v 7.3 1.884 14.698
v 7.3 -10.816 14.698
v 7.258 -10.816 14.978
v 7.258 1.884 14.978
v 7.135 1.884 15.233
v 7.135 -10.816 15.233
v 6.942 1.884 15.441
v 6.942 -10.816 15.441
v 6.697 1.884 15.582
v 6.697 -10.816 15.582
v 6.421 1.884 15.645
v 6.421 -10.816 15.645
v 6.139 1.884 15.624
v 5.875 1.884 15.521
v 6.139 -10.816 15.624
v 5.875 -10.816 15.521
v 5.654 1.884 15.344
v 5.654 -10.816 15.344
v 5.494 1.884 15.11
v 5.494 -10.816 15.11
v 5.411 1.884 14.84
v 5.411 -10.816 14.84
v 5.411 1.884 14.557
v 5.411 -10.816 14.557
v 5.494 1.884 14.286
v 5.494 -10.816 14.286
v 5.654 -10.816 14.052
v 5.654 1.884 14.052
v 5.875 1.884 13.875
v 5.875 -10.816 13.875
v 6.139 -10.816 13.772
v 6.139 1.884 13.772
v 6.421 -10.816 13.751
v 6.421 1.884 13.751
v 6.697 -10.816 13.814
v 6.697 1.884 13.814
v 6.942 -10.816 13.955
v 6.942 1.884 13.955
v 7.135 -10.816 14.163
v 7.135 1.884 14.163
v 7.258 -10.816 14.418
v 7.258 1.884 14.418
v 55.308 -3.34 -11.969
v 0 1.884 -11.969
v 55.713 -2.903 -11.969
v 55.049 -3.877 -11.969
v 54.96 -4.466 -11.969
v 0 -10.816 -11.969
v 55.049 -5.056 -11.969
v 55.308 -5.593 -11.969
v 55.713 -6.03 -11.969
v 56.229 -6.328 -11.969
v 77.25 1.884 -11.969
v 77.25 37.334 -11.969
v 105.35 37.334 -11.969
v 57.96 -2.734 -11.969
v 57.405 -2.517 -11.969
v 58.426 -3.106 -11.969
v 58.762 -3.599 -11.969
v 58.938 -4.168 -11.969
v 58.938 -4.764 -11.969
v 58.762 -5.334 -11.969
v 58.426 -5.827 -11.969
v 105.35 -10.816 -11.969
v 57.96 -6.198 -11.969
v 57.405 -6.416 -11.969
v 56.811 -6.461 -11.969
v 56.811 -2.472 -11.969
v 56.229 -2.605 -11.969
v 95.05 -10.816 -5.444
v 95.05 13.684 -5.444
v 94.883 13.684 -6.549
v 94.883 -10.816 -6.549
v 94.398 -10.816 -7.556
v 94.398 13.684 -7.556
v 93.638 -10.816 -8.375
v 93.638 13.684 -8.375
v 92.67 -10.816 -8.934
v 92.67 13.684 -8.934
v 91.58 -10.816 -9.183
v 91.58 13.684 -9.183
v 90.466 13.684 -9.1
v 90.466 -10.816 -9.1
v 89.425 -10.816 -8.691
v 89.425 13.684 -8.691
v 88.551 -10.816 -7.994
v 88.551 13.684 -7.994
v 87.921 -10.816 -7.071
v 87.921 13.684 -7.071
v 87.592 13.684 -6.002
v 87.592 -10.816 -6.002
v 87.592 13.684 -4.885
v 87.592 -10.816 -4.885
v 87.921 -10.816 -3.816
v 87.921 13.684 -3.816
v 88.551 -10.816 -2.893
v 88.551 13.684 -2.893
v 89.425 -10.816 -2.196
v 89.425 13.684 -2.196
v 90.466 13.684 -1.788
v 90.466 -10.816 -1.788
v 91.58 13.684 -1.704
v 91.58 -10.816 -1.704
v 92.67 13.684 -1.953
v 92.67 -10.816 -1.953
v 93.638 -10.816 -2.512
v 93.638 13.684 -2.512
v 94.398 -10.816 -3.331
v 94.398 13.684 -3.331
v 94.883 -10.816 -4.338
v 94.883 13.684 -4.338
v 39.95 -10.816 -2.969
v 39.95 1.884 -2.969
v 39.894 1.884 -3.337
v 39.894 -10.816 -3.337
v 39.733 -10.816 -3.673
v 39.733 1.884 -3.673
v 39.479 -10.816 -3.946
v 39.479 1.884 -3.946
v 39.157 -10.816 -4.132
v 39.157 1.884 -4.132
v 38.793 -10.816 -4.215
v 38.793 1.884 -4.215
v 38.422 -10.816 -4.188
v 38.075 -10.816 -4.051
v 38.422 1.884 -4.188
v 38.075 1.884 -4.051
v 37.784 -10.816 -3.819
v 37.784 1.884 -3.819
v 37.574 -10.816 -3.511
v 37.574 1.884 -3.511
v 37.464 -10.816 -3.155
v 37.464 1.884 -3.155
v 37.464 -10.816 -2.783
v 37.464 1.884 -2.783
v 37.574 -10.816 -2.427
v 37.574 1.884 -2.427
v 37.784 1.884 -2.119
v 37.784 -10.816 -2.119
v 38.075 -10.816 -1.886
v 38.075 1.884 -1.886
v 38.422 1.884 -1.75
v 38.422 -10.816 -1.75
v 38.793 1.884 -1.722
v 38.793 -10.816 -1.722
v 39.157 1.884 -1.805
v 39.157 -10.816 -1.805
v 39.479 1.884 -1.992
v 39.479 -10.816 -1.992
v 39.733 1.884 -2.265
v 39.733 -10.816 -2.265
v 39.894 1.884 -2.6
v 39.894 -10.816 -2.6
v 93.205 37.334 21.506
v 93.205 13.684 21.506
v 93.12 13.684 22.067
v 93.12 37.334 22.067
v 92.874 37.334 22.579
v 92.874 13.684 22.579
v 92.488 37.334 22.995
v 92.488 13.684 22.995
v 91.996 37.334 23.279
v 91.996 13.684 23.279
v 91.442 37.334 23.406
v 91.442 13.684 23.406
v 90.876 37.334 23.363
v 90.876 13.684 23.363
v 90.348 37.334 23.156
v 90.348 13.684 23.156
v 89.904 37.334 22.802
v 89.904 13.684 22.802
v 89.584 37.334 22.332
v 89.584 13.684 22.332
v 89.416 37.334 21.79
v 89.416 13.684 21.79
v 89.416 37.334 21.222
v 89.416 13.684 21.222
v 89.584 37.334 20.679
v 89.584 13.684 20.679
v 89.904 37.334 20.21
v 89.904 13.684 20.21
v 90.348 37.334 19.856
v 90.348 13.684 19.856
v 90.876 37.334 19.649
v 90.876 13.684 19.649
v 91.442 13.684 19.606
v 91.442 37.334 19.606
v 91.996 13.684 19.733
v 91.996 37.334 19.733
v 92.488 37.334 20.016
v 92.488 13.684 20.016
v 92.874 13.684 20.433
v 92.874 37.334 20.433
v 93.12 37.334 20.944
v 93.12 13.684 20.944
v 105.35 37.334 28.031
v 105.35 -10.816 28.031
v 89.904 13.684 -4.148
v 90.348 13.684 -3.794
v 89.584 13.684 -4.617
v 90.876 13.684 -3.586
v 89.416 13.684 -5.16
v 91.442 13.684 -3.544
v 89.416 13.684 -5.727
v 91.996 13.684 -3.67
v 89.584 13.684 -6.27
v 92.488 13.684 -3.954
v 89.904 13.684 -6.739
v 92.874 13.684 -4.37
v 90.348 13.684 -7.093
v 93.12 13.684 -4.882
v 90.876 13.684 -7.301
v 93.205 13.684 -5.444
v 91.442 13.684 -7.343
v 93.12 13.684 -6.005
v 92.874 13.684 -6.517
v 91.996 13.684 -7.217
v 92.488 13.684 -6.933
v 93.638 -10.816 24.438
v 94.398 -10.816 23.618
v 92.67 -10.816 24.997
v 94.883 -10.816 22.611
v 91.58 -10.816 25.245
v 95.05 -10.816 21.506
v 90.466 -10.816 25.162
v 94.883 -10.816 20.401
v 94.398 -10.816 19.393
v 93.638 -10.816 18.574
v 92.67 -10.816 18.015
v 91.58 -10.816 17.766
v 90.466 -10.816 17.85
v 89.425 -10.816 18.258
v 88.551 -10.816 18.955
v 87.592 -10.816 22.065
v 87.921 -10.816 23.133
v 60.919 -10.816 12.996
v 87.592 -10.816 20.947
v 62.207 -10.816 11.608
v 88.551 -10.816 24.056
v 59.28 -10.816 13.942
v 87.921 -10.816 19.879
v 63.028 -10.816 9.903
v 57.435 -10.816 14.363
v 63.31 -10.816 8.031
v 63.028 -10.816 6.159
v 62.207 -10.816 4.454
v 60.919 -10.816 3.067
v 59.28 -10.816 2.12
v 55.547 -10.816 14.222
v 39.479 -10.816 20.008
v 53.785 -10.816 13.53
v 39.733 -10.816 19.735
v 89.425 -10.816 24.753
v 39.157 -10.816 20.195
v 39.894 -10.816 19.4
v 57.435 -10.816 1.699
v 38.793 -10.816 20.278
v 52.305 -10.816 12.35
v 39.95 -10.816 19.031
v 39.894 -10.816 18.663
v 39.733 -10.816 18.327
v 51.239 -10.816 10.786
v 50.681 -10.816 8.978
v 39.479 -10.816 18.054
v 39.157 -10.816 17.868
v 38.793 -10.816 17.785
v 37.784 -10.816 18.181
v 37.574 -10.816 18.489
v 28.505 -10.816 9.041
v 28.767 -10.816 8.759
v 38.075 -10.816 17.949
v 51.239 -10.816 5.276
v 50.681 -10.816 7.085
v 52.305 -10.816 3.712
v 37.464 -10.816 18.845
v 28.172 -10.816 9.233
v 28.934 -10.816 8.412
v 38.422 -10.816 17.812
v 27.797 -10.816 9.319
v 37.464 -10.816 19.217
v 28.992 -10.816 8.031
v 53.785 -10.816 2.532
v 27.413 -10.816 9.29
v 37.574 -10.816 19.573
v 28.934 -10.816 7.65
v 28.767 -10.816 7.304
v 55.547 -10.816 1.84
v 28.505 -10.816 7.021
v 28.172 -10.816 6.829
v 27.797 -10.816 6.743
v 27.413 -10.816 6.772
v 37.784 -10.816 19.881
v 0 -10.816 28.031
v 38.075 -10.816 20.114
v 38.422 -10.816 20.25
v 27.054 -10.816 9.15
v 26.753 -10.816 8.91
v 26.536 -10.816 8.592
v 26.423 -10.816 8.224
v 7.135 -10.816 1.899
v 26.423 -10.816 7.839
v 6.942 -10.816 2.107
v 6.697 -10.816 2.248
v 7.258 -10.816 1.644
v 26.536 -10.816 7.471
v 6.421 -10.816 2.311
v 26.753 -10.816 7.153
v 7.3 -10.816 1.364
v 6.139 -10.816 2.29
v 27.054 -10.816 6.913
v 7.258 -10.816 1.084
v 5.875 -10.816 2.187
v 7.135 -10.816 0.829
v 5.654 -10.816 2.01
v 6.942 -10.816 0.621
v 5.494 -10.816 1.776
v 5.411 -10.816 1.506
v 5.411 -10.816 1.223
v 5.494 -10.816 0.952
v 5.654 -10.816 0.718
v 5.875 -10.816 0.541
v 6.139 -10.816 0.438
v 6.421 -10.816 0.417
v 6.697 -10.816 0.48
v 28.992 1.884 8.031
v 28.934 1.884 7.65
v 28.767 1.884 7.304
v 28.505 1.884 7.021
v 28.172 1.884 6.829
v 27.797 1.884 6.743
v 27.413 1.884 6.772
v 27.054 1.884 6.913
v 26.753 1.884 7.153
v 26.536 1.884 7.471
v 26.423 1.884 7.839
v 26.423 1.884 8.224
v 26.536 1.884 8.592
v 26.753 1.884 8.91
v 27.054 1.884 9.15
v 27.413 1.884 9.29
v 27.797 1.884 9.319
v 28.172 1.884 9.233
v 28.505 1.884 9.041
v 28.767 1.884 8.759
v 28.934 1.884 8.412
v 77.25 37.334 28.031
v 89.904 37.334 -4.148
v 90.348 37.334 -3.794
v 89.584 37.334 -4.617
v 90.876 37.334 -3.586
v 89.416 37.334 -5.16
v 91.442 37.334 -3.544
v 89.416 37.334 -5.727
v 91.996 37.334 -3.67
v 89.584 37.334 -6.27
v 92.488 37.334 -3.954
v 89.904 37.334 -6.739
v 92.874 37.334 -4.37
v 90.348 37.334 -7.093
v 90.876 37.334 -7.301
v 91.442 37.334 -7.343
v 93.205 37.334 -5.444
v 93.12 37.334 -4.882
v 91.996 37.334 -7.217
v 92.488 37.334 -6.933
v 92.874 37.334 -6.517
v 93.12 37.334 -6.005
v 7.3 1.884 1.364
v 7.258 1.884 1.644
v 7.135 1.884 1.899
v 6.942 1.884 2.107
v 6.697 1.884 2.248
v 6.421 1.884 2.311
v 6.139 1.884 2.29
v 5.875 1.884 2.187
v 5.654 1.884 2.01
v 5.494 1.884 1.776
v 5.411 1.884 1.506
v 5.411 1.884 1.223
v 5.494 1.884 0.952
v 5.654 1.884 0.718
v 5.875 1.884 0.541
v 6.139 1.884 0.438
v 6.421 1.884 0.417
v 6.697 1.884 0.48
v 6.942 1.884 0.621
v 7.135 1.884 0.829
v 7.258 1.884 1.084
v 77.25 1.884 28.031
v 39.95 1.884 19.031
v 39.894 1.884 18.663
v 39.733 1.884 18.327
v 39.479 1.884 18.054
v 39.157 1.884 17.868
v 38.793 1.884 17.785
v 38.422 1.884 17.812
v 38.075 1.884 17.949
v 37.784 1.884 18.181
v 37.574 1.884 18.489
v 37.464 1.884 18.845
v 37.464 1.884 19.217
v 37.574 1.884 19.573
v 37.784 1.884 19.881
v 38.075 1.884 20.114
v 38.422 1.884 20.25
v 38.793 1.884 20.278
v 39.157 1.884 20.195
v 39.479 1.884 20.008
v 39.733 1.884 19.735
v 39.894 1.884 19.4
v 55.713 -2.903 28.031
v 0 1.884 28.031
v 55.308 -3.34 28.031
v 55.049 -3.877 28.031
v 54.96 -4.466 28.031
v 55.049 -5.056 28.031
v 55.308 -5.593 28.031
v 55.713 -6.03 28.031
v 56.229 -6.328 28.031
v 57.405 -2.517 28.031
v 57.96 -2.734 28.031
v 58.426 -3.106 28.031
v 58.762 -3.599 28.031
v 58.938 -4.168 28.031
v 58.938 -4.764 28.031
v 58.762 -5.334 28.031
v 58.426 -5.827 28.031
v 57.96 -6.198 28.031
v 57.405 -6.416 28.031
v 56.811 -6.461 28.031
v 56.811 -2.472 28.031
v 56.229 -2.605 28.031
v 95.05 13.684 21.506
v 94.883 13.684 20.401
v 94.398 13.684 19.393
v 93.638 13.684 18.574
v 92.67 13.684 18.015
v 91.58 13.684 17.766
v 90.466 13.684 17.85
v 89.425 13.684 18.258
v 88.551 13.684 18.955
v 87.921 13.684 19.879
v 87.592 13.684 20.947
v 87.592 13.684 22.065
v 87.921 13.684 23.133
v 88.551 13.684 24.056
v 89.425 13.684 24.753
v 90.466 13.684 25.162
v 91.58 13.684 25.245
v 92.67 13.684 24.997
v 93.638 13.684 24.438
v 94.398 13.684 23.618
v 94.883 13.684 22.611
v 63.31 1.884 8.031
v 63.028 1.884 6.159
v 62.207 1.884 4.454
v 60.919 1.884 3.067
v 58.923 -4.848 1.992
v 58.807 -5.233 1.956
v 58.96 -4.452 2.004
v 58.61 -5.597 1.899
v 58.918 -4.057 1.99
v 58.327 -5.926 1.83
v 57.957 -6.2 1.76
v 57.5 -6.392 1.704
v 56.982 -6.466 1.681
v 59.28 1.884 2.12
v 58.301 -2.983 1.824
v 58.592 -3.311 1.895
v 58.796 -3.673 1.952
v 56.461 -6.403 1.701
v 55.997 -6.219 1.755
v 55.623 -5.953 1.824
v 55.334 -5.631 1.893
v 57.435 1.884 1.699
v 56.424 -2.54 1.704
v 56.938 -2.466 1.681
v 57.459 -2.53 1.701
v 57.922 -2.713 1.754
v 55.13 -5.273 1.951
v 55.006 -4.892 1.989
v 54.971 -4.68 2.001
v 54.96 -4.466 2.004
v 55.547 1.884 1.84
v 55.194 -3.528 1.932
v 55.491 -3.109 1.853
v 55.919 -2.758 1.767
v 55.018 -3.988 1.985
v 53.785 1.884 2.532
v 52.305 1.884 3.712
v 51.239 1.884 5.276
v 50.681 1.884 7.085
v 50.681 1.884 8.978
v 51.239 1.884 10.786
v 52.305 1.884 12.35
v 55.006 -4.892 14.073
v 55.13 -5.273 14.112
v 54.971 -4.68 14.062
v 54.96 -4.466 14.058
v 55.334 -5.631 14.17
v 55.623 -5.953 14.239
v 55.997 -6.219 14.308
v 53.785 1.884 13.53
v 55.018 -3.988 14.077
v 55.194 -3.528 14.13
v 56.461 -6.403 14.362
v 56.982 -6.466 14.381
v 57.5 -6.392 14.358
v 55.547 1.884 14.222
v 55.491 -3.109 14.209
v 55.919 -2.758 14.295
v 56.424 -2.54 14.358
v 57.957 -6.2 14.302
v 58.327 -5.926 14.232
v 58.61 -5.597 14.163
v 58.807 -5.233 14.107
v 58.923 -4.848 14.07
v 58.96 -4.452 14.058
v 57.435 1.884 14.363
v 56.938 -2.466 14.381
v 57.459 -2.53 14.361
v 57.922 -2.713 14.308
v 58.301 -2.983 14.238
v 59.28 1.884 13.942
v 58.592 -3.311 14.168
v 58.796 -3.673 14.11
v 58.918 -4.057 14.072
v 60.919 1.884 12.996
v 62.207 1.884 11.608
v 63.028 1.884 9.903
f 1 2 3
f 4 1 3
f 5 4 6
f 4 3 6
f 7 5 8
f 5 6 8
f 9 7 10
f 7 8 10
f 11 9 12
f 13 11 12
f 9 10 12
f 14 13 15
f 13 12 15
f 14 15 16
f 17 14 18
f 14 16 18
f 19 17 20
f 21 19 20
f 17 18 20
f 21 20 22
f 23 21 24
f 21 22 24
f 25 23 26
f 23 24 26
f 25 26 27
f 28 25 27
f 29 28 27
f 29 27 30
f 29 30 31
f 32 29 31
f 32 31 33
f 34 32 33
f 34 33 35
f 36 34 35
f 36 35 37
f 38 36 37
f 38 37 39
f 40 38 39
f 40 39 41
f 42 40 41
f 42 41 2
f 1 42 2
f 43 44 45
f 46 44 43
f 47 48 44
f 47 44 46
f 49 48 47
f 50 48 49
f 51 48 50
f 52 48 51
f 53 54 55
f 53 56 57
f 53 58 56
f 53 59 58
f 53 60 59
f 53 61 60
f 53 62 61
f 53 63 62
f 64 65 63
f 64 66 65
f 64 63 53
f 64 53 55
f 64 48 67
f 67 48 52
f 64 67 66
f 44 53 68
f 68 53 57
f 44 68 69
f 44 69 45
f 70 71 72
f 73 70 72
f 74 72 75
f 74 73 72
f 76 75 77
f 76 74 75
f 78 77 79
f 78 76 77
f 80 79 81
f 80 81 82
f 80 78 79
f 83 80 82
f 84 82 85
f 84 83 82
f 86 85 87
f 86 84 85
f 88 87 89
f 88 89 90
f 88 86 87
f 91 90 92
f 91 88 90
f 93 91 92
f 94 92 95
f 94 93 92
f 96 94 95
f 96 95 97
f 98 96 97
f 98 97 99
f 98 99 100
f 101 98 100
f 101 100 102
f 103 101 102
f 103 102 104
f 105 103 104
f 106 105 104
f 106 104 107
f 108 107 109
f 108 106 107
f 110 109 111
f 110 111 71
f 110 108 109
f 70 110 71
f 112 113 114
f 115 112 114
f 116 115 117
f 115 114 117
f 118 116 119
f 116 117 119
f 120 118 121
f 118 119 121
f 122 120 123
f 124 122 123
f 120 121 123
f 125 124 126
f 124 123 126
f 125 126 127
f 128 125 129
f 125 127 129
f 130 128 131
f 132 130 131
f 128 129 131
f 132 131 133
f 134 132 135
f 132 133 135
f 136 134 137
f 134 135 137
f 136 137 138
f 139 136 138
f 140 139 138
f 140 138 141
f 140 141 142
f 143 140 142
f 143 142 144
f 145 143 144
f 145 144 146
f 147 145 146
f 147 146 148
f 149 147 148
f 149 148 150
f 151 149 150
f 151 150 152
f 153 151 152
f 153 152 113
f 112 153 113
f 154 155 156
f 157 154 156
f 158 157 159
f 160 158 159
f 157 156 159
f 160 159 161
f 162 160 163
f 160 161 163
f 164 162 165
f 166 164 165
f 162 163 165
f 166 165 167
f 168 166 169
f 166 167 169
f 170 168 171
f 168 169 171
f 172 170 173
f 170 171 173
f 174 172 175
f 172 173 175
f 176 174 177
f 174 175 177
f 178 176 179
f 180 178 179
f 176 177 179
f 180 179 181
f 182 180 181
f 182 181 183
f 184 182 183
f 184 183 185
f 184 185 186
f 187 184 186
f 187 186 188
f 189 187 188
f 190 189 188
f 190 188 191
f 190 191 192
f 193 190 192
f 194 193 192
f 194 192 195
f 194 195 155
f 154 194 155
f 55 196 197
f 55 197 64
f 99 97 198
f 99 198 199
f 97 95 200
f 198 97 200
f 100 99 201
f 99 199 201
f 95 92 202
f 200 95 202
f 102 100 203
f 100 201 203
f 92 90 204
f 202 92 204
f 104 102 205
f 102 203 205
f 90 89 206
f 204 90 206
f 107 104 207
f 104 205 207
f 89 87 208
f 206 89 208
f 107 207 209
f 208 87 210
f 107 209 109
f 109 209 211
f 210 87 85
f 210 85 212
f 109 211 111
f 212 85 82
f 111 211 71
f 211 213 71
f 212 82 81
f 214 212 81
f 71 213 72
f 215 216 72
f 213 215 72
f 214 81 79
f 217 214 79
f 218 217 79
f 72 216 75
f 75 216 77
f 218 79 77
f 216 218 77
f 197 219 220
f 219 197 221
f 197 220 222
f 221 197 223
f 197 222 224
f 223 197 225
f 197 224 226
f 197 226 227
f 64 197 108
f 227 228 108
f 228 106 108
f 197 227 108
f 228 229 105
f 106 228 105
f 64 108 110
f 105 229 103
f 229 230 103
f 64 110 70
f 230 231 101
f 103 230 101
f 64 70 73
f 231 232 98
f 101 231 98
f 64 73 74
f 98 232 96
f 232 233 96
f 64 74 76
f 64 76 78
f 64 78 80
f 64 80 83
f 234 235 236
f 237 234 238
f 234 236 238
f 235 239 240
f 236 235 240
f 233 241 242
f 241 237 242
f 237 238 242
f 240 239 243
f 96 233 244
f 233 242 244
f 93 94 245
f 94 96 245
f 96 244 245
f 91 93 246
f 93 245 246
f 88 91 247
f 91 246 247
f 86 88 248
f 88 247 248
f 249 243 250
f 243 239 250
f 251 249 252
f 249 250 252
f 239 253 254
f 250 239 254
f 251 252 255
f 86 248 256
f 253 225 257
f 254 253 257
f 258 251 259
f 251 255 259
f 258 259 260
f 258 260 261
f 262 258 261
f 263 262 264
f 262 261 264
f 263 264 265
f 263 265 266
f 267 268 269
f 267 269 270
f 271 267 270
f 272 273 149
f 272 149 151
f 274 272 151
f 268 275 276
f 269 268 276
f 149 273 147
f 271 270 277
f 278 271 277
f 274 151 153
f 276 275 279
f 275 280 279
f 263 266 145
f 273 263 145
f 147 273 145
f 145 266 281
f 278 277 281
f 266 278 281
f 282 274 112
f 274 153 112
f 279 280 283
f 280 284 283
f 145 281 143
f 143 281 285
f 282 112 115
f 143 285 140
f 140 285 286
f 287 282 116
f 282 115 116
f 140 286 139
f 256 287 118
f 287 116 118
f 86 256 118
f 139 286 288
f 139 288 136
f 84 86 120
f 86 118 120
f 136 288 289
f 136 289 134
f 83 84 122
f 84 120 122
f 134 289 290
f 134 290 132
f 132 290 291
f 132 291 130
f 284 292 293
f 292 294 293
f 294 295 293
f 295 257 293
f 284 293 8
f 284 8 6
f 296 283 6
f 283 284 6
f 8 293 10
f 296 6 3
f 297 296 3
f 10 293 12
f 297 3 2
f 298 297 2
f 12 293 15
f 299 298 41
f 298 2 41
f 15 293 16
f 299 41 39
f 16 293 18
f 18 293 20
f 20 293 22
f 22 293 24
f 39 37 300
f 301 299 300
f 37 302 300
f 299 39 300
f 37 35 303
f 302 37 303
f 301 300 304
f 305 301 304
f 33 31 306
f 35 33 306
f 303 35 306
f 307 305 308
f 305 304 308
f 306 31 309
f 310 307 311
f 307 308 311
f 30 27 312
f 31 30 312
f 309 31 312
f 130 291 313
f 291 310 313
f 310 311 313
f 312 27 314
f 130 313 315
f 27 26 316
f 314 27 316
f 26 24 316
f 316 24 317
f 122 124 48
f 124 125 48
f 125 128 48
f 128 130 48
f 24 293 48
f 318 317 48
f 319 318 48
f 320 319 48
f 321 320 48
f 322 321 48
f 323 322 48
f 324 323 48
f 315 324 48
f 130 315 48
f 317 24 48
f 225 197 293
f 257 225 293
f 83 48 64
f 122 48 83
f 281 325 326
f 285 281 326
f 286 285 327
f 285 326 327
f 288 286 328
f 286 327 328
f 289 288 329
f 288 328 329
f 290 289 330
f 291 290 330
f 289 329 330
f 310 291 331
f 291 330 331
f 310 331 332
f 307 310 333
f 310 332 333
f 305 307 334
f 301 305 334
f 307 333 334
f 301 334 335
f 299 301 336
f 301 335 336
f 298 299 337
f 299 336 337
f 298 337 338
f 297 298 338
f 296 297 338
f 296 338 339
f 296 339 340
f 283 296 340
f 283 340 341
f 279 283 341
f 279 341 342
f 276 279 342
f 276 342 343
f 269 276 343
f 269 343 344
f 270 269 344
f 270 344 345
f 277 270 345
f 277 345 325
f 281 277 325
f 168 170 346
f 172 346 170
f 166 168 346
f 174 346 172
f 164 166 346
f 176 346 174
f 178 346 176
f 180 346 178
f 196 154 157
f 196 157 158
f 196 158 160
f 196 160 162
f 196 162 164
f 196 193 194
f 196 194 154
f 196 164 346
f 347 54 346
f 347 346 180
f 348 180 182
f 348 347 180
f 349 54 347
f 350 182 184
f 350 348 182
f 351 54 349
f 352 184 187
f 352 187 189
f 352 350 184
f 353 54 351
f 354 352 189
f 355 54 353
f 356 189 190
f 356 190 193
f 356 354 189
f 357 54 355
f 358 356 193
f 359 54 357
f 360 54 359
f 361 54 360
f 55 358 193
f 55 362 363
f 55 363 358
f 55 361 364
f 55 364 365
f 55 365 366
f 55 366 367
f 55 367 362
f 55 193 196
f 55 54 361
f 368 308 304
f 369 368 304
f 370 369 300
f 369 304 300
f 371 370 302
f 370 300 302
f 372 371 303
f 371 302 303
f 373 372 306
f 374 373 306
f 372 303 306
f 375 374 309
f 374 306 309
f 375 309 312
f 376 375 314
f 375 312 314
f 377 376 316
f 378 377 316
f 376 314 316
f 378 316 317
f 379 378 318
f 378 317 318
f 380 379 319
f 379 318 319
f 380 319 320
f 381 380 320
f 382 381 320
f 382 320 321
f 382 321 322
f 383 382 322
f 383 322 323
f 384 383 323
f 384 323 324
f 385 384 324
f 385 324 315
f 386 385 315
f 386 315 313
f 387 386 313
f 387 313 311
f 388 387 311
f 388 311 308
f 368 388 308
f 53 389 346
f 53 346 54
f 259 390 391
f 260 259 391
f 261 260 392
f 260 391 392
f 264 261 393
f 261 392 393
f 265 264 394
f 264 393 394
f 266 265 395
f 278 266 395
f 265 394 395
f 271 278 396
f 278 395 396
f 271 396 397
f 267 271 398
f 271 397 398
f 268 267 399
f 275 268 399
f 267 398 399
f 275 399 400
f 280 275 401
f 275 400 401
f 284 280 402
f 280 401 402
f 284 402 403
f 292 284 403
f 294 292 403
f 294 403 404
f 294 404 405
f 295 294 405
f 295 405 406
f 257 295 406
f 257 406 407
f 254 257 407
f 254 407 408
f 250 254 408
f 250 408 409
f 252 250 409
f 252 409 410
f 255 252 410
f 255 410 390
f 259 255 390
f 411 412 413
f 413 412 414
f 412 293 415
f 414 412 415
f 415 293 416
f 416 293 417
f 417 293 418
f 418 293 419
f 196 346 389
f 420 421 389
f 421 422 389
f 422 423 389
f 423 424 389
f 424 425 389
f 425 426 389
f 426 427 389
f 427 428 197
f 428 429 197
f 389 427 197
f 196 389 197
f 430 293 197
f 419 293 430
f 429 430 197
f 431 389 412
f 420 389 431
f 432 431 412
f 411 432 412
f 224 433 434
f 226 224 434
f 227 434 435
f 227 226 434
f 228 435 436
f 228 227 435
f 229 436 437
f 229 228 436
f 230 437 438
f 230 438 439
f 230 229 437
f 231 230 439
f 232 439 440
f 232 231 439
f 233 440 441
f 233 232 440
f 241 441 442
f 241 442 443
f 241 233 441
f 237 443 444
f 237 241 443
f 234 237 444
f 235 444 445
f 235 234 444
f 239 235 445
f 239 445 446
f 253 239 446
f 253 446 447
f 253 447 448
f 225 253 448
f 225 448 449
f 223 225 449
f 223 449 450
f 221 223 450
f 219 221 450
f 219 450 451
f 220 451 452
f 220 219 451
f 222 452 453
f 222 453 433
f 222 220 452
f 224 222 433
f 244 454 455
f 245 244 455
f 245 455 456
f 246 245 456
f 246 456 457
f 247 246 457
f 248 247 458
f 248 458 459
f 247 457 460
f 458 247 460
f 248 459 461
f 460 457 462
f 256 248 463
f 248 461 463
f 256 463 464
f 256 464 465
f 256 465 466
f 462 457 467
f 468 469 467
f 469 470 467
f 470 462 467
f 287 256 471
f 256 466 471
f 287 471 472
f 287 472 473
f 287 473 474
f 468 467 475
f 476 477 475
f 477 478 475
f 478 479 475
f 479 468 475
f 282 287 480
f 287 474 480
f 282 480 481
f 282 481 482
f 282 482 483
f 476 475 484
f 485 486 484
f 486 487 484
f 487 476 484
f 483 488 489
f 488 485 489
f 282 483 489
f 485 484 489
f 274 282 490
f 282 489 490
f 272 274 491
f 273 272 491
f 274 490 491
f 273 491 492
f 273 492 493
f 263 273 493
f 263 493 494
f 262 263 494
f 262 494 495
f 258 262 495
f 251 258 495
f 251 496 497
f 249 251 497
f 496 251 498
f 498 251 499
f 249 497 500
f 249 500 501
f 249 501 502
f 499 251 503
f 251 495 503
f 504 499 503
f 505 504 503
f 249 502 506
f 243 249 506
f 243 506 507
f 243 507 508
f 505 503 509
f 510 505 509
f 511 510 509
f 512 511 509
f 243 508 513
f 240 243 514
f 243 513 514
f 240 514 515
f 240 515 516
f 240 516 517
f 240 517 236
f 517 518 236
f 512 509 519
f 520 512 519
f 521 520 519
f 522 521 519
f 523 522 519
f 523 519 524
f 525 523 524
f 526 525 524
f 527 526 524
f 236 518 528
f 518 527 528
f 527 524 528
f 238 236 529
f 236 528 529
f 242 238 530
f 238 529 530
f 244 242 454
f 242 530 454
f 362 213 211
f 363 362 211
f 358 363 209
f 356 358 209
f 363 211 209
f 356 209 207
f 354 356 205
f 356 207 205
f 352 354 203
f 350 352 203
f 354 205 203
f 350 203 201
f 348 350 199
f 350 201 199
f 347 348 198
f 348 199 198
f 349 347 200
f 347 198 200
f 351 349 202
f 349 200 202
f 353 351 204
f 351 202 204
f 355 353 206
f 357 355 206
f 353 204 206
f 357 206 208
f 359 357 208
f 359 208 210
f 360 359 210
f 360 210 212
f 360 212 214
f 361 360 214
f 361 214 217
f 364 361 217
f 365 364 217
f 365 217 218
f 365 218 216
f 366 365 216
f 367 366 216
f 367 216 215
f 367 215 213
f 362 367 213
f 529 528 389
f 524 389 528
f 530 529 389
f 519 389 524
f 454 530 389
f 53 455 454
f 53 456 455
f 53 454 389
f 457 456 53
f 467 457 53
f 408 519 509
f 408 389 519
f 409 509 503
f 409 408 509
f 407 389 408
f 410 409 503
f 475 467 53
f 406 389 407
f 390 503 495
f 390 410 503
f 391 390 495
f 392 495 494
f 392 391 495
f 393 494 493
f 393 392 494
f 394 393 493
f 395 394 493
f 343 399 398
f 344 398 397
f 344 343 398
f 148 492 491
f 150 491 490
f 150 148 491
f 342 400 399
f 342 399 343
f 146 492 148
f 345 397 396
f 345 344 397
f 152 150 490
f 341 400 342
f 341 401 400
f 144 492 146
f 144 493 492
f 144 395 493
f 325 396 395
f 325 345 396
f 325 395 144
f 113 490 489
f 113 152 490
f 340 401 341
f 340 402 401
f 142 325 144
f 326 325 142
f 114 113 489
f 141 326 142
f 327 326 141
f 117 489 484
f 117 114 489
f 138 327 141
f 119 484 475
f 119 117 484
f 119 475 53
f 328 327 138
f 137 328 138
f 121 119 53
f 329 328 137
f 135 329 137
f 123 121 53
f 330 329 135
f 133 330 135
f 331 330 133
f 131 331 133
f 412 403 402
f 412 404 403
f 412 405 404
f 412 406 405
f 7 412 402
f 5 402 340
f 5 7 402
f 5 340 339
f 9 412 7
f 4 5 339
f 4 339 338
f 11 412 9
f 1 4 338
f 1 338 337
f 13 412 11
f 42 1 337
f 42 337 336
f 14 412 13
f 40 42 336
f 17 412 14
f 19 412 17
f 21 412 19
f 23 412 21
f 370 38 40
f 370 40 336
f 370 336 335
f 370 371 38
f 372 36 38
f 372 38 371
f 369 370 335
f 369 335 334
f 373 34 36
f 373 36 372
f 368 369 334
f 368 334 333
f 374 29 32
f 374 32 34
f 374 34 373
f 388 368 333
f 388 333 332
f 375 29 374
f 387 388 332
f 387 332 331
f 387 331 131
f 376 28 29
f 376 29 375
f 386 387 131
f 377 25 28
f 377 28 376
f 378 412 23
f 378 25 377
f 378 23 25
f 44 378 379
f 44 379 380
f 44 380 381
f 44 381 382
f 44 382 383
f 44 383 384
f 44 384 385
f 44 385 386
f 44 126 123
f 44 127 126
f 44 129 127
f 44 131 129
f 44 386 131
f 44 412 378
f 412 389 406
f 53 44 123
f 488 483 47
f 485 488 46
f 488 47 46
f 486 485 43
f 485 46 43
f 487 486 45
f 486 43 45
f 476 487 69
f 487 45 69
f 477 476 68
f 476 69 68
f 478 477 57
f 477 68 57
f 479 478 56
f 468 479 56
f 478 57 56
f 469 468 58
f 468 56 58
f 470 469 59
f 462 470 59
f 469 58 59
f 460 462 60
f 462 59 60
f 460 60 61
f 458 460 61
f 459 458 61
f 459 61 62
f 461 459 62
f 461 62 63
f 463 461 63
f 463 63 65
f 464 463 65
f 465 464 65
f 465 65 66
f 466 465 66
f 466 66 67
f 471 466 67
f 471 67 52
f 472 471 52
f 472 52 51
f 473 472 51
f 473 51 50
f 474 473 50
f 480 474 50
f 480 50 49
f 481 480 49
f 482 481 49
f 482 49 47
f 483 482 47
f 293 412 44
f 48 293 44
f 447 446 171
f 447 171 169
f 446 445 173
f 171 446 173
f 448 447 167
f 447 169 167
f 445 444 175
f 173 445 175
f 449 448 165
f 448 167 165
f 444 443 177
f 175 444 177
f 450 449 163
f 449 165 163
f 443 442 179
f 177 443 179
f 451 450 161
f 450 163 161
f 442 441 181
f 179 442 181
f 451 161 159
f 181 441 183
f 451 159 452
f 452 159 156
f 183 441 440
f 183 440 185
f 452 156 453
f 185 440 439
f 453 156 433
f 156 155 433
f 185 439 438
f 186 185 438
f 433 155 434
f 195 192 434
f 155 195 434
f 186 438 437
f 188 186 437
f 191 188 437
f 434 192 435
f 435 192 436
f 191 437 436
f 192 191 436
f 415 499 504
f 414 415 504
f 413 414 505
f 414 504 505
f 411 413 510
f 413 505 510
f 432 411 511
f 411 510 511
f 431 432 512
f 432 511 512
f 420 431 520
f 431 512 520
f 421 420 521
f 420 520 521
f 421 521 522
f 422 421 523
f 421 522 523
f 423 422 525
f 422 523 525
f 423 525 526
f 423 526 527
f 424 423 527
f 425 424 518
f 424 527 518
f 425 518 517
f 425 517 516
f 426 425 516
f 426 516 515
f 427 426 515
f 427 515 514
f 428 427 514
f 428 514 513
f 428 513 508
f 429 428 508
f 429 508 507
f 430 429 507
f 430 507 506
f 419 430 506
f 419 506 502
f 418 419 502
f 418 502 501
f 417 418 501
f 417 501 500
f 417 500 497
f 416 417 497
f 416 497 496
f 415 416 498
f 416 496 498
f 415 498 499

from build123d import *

# Parameters (mm, degrees)
SKETCH2_W                = 40
SKETCH2_H                = 12.7
BOSS_EXTRUDE1_DEPTH      = 105.35
SKETCH4_R                = 6.35
CUT_EXTRUDE1_DEPTH       = 13.7
F_4_0_4_DIAMETER_HOLE1_D = 4
SKETCH9_R                = 1.291519898
SKETCH9_R_2              = 1.25
CUT_EXTRUDE3_DEPTH       = 13.7000001
SKETCH14_W               = 28.1
SKETCH14_H               = 40
BOSS_EXTRUDE3_DEPTH      = 35.45
SKETCH10_R               = 3.75
CUT_EXTRUDE4_DEPTH       = 24.5
SKETCH15_R               = 1.905
CUT_EXTRUDE7_DEPTH       = 24.65
SKETCH17_R               = 0.95
CUT_EXTRUDE8_DEPTH       = 21


with BuildPart() as part:
    # Sketch2 → Boss-Extrude1 (new body)
    with BuildSketch(Plane(origin=(0, 0, 0), x_dir=(0, 0, -1), z_dir=(1, 0, 0))):
        with Locations((-8.031139822, -4.466363736)):
            Rectangle(SKETCH2_W, SKETCH2_H)
    extrude(amount=BOSS_EXTRUDE1_DEPTH)

    # Sketch4 → Cut-Extrude1 (cut, through all)
    with BuildSketch(Plane(origin=(0, 1.883636264, 0), x_dir=(1, 0, 0), z_dir=(0, 1, 0))):
        with Locations((56.96, -8.031139822)):
            Circle(SKETCH4_R)
    extrude(amount=-CUT_EXTRUDE1_DEPTH, mode=Mode.SUBTRACT)

    # Ø4.0 (4) Diameter Hole1 (through all)
    with Locations(Plane.XY.offset(28.031139822)):
        with Locations((56.96, -4.466363736)):
            Hole(F_4_0_4_DIAMETER_HOLE1_D / 2)

    # Sketch9 → Cut-Extrude3 (cut, through all)
    with BuildSketch(Plane(origin=(0, 1.883636264, 0), x_dir=(1, 0, 0), z_dir=(0, 1, 0))):
        with Locations((27.7, -8.031139822)):
            Circle(SKETCH9_R)
        with Locations((38.7, 2.968860178)):
            Circle(SKETCH9_R_2)
        with Locations((38.7, -19.031139822)):
            Circle(SKETCH9_R_2)
    extrude(amount=-CUT_EXTRUDE3_DEPTH, mode=Mode.SUBTRACT)

    # Sketch14 → Boss-Extrude3 (add)
    with BuildSketch(Plane(origin=(0, 1.883636264, 0), x_dir=(1, 0, 0), z_dir=(0, 1, 0))):
        with Locations((91.3, -8.031139822)):
            Rectangle(SKETCH14_W, SKETCH14_H)
    extrude(amount=BOSS_EXTRUDE3_DEPTH)

    # Sketch10 → Cut-Extrude4 (cut)
    with BuildSketch(Plane(origin=(0, -10.816363736, 0), x_dir=(1, 0, 0), z_dir=(0, 1, 0))):
        with Locations((91.3, -21.505839822)):
            Circle(SKETCH10_R)
        with Locations((91.3, 5.443560178)):
            Circle(SKETCH10_R)
    extrude(amount=CUT_EXTRUDE4_DEPTH, mode=Mode.SUBTRACT)

    # Sketch15 → Cut-Extrude7 (cut, through all)
    with BuildSketch(Plane.XZ.offset(-13.683636264)):
        with Locations((91.3, -5.443560178)):
            Circle(SKETCH15_R)
        with Locations((91.3, 21.505839822)):
            Circle(SKETCH15_R)
    extrude(amount=-CUT_EXTRUDE7_DEPTH, mode=Mode.SUBTRACT)

    # Sketch17 → Cut-Extrude8 (cut)
    with BuildSketch(Plane.XZ.offset(10.816363736)):
        with Locations((6.35, 14.698139822)):
            Circle(SKETCH17_R)
        with Locations((6.35, 1.364139822)):
            Circle(SKETCH17_R)
    extrude(amount=-CUT_EXTRUDE8_DEPTH, mode=Mode.SUBTRACT)


solid = part.part
